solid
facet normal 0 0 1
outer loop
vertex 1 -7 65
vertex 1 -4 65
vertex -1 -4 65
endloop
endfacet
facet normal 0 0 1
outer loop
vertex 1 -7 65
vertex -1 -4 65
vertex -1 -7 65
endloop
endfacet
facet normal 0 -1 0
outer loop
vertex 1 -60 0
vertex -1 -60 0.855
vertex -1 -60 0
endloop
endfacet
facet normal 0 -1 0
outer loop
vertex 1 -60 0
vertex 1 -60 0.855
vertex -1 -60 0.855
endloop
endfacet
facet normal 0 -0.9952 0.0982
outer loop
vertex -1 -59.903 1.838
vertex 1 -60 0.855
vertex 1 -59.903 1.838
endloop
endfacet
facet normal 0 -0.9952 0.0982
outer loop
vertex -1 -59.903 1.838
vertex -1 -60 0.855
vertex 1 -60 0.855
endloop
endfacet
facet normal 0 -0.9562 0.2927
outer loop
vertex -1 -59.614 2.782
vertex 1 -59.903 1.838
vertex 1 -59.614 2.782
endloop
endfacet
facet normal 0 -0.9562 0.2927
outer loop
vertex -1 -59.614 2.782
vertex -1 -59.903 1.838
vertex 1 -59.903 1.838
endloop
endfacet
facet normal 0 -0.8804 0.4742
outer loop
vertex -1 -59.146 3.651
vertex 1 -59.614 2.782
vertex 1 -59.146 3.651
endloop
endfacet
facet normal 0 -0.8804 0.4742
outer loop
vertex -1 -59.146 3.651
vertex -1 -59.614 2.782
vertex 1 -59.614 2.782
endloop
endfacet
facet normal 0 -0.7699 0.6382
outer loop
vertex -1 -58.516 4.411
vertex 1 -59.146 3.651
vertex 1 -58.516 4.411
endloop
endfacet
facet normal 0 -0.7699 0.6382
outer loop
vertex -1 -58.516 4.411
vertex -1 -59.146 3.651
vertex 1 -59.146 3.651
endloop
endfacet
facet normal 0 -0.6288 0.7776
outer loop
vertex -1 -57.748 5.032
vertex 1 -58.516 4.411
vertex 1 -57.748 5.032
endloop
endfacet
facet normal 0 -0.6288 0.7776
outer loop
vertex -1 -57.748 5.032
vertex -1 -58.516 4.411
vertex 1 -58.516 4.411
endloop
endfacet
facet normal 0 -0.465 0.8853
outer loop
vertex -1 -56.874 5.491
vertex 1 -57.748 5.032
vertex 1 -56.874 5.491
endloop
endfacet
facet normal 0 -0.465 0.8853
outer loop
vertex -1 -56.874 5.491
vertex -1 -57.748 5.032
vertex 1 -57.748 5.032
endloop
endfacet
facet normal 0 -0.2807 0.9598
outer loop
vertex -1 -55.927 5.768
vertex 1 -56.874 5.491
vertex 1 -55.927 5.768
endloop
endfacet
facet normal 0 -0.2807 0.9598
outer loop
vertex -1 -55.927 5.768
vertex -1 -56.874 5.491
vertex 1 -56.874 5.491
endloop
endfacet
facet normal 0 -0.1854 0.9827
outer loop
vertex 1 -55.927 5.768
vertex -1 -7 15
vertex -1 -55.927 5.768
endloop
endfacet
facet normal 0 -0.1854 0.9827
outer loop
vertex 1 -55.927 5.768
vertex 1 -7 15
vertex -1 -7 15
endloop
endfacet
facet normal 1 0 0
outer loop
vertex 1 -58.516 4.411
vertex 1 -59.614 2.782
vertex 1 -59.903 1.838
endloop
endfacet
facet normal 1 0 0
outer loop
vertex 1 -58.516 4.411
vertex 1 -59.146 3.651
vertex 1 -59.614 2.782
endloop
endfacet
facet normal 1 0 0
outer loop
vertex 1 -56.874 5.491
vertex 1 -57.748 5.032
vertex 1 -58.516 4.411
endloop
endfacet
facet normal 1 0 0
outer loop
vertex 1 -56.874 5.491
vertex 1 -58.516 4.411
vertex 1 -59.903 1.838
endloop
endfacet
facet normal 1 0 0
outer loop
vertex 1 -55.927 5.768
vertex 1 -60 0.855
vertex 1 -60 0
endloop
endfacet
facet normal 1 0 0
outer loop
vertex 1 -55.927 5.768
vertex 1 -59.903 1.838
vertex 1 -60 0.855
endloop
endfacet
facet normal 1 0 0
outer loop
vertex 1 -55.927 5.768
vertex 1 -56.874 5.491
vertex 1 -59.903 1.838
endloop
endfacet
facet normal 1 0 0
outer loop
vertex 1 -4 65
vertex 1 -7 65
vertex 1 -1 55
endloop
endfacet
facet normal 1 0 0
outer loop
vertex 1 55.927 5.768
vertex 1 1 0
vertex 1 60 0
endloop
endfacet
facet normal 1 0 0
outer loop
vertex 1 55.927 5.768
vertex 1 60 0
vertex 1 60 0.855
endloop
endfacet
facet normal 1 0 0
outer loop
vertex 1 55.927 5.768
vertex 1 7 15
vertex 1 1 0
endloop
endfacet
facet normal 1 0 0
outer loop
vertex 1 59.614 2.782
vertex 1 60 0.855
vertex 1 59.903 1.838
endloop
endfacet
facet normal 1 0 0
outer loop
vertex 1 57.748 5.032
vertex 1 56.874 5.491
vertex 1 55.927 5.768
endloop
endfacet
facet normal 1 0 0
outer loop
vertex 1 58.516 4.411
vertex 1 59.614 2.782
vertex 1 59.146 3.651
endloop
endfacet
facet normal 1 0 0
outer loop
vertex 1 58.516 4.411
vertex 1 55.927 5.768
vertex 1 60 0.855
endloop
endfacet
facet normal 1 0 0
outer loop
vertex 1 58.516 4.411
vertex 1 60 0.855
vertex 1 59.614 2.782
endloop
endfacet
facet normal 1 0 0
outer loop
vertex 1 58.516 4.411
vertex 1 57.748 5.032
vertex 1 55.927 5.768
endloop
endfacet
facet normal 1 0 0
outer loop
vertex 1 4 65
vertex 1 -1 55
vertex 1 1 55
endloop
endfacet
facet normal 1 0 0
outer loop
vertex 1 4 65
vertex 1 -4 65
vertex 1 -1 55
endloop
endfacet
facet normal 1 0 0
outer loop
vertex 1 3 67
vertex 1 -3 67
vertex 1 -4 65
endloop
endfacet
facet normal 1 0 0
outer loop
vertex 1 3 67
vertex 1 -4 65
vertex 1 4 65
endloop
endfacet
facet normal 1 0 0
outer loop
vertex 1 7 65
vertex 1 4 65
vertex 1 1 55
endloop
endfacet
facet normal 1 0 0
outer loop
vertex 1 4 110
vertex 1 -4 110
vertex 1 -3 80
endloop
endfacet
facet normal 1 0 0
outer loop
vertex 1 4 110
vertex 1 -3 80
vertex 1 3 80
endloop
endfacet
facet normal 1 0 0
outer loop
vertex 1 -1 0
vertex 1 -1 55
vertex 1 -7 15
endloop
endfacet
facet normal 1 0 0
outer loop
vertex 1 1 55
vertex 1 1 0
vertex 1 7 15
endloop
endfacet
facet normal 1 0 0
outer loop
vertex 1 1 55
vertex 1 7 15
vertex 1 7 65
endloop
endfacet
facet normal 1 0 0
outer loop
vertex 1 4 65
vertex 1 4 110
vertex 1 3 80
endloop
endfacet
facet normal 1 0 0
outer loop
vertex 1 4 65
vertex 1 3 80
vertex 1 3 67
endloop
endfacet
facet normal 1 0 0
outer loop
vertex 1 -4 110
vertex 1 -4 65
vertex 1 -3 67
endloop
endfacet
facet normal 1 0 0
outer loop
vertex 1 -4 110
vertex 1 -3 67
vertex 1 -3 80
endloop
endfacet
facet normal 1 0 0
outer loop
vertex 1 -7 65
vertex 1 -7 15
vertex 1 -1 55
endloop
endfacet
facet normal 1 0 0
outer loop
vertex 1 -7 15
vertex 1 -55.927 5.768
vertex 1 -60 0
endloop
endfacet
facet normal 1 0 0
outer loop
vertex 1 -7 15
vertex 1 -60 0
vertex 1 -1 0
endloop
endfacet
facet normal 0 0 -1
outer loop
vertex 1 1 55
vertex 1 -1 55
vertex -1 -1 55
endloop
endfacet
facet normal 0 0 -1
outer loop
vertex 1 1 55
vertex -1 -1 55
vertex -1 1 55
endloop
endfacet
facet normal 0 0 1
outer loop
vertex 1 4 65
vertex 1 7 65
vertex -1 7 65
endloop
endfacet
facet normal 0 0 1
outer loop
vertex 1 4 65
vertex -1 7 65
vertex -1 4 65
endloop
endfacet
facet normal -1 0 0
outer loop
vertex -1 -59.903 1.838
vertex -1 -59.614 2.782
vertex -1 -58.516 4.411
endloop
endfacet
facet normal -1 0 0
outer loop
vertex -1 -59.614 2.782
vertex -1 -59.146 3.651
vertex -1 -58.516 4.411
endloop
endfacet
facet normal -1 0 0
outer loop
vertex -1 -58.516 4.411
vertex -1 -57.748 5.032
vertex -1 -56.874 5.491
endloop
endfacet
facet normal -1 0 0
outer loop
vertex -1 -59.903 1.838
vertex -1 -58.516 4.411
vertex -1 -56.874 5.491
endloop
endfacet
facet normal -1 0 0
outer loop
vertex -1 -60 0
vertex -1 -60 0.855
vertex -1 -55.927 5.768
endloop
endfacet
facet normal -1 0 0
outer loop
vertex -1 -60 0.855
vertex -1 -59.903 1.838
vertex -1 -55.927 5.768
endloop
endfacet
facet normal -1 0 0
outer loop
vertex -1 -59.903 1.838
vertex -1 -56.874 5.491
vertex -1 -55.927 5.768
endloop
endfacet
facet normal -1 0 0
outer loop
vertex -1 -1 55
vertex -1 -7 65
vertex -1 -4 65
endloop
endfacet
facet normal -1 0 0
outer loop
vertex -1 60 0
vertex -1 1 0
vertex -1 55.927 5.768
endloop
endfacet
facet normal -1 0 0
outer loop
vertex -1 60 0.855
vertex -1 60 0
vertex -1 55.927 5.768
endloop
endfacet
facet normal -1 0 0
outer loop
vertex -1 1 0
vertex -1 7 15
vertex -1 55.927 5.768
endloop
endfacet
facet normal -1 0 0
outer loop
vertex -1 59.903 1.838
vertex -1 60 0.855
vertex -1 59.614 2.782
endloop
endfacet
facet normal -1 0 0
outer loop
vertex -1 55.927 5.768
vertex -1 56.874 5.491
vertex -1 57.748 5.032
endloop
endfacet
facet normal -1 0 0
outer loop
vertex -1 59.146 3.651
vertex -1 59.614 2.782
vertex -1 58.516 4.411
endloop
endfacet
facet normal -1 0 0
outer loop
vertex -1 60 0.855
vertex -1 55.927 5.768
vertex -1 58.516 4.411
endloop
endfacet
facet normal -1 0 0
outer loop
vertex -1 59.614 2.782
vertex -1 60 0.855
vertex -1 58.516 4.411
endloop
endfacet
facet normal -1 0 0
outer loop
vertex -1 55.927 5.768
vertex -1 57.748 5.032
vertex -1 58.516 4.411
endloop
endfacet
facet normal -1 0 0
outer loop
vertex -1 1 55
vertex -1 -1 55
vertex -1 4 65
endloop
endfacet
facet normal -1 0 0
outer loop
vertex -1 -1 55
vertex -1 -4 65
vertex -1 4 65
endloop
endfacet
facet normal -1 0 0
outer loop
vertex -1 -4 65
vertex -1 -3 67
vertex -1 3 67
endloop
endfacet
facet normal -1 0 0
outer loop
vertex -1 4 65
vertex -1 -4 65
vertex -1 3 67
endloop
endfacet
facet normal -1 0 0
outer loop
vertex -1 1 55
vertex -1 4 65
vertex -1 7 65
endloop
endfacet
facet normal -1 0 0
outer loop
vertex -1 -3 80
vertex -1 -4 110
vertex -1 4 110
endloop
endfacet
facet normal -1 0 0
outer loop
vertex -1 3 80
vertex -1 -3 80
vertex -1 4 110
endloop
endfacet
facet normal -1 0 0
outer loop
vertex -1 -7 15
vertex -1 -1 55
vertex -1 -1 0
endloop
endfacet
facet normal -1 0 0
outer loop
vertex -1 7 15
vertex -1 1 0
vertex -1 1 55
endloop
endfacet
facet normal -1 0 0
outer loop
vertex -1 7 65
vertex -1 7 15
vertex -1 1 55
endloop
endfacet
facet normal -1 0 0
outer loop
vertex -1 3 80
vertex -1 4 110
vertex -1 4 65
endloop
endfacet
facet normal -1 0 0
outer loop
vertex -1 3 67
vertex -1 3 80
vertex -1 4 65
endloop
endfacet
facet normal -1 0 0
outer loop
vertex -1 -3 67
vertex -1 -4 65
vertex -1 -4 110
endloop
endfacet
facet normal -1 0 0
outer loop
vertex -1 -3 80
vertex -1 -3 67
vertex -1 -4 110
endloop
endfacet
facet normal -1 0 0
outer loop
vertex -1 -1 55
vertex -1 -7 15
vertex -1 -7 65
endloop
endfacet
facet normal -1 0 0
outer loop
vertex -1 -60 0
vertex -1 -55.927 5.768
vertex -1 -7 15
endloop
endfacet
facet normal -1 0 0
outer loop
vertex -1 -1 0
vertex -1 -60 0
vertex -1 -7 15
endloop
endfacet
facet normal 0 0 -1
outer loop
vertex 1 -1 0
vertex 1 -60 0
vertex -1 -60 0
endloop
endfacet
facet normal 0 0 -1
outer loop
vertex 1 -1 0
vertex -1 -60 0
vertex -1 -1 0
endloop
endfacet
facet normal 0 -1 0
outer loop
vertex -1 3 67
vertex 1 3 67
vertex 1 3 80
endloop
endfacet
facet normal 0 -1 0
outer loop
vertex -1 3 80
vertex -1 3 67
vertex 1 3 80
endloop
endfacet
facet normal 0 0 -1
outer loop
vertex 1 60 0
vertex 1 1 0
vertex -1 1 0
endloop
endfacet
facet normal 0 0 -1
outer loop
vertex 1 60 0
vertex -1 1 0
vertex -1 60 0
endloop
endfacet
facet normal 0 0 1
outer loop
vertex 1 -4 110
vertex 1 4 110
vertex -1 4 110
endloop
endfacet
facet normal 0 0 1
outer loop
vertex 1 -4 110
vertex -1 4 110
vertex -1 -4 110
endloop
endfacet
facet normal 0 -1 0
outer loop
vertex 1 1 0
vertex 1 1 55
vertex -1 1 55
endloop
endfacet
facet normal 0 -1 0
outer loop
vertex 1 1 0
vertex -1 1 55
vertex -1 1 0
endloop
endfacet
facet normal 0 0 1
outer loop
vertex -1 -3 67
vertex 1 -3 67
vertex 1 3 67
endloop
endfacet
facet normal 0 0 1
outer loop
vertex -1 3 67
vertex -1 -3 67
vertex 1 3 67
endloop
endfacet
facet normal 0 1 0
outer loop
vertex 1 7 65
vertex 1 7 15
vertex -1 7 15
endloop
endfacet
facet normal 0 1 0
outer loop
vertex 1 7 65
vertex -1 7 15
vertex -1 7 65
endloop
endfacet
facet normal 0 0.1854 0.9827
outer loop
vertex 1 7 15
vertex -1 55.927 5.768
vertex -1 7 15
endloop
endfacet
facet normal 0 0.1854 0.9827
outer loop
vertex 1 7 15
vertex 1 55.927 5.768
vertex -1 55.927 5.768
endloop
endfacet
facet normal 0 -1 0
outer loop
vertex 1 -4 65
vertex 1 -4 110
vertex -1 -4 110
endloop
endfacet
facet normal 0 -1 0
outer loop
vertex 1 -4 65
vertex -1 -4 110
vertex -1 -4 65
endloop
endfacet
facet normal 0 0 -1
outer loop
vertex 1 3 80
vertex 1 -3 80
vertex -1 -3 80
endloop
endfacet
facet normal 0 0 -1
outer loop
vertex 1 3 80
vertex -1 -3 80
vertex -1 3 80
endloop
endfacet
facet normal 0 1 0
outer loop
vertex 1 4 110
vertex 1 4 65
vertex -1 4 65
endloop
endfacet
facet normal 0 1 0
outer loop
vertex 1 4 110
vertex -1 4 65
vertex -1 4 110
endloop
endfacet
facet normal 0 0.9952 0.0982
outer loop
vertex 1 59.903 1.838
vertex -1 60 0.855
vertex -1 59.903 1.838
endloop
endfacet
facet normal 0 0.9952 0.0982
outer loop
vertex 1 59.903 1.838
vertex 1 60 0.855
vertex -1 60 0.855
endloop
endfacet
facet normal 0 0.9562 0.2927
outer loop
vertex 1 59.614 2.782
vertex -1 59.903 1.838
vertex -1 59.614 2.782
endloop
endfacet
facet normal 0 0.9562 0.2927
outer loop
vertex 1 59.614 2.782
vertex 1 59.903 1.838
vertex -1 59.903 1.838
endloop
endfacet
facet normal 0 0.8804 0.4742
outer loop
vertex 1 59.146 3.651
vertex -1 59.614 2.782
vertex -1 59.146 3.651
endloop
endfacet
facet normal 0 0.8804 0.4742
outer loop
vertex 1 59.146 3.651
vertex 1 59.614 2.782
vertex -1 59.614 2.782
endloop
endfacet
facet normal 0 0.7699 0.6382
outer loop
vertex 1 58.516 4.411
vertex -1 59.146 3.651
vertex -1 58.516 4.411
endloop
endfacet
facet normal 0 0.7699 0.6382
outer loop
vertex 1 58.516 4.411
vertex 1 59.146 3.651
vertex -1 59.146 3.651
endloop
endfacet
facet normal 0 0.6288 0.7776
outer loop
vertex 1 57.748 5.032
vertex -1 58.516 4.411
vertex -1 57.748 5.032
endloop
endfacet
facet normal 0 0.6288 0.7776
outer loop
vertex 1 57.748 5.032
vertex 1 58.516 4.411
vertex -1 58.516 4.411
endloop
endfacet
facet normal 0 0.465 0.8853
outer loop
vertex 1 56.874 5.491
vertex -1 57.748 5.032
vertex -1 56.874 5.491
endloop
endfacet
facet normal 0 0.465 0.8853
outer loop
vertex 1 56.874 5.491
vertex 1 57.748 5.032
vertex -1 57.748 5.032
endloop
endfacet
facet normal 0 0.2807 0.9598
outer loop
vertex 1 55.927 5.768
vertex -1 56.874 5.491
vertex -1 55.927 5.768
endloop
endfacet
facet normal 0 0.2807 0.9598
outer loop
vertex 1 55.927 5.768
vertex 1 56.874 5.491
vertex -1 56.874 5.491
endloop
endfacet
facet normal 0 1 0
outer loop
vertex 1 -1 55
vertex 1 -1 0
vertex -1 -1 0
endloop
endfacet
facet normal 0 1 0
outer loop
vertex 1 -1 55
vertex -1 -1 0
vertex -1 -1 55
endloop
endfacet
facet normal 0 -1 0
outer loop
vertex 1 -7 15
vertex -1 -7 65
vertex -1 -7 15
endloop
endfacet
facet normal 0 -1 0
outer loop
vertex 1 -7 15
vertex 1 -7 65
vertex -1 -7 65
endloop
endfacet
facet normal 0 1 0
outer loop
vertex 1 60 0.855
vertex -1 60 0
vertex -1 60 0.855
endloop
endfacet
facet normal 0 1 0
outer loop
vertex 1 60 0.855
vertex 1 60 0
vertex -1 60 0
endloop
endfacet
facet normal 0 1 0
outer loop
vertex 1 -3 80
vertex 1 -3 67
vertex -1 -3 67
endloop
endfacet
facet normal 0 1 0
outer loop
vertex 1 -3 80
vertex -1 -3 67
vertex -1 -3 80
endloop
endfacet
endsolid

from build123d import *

# Parameters (mm, degrees)
F1_DEPTH      = 1
F1_DEPTH_BACK = 1
F2_W          = 6
F2_H          = 13
F3_DEPTH      = 2
F3_DEPTH_BACK = 2
F4_R          = 5


with BuildPart() as f1:
    # F0 (on Right) → F1 (new body, two sides)
    with BuildSketch(Plane.YZ) as f1_sk:
        Polygon((-60, 5), (-60, 0), (-1, 0), (-1, 55), (1, 55), (1, 0), (60, 0), (60, 5), (7, 15), (7, 65), (4, 65), (4, 110), (-4, 110), (-4, 65), (-7, 65), (-7, 15), align=None)
    extrude(amount=F1_DEPTH)
    extrude(f1_sk.sketch, amount=-F1_DEPTH_BACK)

    # F2 (on face) → F3 (cut, two sides)
    with BuildSketch(Plane.YZ.offset(1)) as f3_sk:
        with Locations((0, 73.5)):
            Rectangle(F2_W, F2_H)
    extrude(amount=-F3_DEPTH, mode=Mode.SUBTRACT)
    extrude(f3_sk.sketch, amount=-F3_DEPTH_BACK, mode=Mode.SUBTRACT)

    # F4
    f4_edges = [f1.edges().sort_by_distance(p)[0] for p in [
        (0, -60, 5),
        (0, 60, 5),
    ]]
    fillet(f4_edges, radius=F4_R)


solid = f1.part
